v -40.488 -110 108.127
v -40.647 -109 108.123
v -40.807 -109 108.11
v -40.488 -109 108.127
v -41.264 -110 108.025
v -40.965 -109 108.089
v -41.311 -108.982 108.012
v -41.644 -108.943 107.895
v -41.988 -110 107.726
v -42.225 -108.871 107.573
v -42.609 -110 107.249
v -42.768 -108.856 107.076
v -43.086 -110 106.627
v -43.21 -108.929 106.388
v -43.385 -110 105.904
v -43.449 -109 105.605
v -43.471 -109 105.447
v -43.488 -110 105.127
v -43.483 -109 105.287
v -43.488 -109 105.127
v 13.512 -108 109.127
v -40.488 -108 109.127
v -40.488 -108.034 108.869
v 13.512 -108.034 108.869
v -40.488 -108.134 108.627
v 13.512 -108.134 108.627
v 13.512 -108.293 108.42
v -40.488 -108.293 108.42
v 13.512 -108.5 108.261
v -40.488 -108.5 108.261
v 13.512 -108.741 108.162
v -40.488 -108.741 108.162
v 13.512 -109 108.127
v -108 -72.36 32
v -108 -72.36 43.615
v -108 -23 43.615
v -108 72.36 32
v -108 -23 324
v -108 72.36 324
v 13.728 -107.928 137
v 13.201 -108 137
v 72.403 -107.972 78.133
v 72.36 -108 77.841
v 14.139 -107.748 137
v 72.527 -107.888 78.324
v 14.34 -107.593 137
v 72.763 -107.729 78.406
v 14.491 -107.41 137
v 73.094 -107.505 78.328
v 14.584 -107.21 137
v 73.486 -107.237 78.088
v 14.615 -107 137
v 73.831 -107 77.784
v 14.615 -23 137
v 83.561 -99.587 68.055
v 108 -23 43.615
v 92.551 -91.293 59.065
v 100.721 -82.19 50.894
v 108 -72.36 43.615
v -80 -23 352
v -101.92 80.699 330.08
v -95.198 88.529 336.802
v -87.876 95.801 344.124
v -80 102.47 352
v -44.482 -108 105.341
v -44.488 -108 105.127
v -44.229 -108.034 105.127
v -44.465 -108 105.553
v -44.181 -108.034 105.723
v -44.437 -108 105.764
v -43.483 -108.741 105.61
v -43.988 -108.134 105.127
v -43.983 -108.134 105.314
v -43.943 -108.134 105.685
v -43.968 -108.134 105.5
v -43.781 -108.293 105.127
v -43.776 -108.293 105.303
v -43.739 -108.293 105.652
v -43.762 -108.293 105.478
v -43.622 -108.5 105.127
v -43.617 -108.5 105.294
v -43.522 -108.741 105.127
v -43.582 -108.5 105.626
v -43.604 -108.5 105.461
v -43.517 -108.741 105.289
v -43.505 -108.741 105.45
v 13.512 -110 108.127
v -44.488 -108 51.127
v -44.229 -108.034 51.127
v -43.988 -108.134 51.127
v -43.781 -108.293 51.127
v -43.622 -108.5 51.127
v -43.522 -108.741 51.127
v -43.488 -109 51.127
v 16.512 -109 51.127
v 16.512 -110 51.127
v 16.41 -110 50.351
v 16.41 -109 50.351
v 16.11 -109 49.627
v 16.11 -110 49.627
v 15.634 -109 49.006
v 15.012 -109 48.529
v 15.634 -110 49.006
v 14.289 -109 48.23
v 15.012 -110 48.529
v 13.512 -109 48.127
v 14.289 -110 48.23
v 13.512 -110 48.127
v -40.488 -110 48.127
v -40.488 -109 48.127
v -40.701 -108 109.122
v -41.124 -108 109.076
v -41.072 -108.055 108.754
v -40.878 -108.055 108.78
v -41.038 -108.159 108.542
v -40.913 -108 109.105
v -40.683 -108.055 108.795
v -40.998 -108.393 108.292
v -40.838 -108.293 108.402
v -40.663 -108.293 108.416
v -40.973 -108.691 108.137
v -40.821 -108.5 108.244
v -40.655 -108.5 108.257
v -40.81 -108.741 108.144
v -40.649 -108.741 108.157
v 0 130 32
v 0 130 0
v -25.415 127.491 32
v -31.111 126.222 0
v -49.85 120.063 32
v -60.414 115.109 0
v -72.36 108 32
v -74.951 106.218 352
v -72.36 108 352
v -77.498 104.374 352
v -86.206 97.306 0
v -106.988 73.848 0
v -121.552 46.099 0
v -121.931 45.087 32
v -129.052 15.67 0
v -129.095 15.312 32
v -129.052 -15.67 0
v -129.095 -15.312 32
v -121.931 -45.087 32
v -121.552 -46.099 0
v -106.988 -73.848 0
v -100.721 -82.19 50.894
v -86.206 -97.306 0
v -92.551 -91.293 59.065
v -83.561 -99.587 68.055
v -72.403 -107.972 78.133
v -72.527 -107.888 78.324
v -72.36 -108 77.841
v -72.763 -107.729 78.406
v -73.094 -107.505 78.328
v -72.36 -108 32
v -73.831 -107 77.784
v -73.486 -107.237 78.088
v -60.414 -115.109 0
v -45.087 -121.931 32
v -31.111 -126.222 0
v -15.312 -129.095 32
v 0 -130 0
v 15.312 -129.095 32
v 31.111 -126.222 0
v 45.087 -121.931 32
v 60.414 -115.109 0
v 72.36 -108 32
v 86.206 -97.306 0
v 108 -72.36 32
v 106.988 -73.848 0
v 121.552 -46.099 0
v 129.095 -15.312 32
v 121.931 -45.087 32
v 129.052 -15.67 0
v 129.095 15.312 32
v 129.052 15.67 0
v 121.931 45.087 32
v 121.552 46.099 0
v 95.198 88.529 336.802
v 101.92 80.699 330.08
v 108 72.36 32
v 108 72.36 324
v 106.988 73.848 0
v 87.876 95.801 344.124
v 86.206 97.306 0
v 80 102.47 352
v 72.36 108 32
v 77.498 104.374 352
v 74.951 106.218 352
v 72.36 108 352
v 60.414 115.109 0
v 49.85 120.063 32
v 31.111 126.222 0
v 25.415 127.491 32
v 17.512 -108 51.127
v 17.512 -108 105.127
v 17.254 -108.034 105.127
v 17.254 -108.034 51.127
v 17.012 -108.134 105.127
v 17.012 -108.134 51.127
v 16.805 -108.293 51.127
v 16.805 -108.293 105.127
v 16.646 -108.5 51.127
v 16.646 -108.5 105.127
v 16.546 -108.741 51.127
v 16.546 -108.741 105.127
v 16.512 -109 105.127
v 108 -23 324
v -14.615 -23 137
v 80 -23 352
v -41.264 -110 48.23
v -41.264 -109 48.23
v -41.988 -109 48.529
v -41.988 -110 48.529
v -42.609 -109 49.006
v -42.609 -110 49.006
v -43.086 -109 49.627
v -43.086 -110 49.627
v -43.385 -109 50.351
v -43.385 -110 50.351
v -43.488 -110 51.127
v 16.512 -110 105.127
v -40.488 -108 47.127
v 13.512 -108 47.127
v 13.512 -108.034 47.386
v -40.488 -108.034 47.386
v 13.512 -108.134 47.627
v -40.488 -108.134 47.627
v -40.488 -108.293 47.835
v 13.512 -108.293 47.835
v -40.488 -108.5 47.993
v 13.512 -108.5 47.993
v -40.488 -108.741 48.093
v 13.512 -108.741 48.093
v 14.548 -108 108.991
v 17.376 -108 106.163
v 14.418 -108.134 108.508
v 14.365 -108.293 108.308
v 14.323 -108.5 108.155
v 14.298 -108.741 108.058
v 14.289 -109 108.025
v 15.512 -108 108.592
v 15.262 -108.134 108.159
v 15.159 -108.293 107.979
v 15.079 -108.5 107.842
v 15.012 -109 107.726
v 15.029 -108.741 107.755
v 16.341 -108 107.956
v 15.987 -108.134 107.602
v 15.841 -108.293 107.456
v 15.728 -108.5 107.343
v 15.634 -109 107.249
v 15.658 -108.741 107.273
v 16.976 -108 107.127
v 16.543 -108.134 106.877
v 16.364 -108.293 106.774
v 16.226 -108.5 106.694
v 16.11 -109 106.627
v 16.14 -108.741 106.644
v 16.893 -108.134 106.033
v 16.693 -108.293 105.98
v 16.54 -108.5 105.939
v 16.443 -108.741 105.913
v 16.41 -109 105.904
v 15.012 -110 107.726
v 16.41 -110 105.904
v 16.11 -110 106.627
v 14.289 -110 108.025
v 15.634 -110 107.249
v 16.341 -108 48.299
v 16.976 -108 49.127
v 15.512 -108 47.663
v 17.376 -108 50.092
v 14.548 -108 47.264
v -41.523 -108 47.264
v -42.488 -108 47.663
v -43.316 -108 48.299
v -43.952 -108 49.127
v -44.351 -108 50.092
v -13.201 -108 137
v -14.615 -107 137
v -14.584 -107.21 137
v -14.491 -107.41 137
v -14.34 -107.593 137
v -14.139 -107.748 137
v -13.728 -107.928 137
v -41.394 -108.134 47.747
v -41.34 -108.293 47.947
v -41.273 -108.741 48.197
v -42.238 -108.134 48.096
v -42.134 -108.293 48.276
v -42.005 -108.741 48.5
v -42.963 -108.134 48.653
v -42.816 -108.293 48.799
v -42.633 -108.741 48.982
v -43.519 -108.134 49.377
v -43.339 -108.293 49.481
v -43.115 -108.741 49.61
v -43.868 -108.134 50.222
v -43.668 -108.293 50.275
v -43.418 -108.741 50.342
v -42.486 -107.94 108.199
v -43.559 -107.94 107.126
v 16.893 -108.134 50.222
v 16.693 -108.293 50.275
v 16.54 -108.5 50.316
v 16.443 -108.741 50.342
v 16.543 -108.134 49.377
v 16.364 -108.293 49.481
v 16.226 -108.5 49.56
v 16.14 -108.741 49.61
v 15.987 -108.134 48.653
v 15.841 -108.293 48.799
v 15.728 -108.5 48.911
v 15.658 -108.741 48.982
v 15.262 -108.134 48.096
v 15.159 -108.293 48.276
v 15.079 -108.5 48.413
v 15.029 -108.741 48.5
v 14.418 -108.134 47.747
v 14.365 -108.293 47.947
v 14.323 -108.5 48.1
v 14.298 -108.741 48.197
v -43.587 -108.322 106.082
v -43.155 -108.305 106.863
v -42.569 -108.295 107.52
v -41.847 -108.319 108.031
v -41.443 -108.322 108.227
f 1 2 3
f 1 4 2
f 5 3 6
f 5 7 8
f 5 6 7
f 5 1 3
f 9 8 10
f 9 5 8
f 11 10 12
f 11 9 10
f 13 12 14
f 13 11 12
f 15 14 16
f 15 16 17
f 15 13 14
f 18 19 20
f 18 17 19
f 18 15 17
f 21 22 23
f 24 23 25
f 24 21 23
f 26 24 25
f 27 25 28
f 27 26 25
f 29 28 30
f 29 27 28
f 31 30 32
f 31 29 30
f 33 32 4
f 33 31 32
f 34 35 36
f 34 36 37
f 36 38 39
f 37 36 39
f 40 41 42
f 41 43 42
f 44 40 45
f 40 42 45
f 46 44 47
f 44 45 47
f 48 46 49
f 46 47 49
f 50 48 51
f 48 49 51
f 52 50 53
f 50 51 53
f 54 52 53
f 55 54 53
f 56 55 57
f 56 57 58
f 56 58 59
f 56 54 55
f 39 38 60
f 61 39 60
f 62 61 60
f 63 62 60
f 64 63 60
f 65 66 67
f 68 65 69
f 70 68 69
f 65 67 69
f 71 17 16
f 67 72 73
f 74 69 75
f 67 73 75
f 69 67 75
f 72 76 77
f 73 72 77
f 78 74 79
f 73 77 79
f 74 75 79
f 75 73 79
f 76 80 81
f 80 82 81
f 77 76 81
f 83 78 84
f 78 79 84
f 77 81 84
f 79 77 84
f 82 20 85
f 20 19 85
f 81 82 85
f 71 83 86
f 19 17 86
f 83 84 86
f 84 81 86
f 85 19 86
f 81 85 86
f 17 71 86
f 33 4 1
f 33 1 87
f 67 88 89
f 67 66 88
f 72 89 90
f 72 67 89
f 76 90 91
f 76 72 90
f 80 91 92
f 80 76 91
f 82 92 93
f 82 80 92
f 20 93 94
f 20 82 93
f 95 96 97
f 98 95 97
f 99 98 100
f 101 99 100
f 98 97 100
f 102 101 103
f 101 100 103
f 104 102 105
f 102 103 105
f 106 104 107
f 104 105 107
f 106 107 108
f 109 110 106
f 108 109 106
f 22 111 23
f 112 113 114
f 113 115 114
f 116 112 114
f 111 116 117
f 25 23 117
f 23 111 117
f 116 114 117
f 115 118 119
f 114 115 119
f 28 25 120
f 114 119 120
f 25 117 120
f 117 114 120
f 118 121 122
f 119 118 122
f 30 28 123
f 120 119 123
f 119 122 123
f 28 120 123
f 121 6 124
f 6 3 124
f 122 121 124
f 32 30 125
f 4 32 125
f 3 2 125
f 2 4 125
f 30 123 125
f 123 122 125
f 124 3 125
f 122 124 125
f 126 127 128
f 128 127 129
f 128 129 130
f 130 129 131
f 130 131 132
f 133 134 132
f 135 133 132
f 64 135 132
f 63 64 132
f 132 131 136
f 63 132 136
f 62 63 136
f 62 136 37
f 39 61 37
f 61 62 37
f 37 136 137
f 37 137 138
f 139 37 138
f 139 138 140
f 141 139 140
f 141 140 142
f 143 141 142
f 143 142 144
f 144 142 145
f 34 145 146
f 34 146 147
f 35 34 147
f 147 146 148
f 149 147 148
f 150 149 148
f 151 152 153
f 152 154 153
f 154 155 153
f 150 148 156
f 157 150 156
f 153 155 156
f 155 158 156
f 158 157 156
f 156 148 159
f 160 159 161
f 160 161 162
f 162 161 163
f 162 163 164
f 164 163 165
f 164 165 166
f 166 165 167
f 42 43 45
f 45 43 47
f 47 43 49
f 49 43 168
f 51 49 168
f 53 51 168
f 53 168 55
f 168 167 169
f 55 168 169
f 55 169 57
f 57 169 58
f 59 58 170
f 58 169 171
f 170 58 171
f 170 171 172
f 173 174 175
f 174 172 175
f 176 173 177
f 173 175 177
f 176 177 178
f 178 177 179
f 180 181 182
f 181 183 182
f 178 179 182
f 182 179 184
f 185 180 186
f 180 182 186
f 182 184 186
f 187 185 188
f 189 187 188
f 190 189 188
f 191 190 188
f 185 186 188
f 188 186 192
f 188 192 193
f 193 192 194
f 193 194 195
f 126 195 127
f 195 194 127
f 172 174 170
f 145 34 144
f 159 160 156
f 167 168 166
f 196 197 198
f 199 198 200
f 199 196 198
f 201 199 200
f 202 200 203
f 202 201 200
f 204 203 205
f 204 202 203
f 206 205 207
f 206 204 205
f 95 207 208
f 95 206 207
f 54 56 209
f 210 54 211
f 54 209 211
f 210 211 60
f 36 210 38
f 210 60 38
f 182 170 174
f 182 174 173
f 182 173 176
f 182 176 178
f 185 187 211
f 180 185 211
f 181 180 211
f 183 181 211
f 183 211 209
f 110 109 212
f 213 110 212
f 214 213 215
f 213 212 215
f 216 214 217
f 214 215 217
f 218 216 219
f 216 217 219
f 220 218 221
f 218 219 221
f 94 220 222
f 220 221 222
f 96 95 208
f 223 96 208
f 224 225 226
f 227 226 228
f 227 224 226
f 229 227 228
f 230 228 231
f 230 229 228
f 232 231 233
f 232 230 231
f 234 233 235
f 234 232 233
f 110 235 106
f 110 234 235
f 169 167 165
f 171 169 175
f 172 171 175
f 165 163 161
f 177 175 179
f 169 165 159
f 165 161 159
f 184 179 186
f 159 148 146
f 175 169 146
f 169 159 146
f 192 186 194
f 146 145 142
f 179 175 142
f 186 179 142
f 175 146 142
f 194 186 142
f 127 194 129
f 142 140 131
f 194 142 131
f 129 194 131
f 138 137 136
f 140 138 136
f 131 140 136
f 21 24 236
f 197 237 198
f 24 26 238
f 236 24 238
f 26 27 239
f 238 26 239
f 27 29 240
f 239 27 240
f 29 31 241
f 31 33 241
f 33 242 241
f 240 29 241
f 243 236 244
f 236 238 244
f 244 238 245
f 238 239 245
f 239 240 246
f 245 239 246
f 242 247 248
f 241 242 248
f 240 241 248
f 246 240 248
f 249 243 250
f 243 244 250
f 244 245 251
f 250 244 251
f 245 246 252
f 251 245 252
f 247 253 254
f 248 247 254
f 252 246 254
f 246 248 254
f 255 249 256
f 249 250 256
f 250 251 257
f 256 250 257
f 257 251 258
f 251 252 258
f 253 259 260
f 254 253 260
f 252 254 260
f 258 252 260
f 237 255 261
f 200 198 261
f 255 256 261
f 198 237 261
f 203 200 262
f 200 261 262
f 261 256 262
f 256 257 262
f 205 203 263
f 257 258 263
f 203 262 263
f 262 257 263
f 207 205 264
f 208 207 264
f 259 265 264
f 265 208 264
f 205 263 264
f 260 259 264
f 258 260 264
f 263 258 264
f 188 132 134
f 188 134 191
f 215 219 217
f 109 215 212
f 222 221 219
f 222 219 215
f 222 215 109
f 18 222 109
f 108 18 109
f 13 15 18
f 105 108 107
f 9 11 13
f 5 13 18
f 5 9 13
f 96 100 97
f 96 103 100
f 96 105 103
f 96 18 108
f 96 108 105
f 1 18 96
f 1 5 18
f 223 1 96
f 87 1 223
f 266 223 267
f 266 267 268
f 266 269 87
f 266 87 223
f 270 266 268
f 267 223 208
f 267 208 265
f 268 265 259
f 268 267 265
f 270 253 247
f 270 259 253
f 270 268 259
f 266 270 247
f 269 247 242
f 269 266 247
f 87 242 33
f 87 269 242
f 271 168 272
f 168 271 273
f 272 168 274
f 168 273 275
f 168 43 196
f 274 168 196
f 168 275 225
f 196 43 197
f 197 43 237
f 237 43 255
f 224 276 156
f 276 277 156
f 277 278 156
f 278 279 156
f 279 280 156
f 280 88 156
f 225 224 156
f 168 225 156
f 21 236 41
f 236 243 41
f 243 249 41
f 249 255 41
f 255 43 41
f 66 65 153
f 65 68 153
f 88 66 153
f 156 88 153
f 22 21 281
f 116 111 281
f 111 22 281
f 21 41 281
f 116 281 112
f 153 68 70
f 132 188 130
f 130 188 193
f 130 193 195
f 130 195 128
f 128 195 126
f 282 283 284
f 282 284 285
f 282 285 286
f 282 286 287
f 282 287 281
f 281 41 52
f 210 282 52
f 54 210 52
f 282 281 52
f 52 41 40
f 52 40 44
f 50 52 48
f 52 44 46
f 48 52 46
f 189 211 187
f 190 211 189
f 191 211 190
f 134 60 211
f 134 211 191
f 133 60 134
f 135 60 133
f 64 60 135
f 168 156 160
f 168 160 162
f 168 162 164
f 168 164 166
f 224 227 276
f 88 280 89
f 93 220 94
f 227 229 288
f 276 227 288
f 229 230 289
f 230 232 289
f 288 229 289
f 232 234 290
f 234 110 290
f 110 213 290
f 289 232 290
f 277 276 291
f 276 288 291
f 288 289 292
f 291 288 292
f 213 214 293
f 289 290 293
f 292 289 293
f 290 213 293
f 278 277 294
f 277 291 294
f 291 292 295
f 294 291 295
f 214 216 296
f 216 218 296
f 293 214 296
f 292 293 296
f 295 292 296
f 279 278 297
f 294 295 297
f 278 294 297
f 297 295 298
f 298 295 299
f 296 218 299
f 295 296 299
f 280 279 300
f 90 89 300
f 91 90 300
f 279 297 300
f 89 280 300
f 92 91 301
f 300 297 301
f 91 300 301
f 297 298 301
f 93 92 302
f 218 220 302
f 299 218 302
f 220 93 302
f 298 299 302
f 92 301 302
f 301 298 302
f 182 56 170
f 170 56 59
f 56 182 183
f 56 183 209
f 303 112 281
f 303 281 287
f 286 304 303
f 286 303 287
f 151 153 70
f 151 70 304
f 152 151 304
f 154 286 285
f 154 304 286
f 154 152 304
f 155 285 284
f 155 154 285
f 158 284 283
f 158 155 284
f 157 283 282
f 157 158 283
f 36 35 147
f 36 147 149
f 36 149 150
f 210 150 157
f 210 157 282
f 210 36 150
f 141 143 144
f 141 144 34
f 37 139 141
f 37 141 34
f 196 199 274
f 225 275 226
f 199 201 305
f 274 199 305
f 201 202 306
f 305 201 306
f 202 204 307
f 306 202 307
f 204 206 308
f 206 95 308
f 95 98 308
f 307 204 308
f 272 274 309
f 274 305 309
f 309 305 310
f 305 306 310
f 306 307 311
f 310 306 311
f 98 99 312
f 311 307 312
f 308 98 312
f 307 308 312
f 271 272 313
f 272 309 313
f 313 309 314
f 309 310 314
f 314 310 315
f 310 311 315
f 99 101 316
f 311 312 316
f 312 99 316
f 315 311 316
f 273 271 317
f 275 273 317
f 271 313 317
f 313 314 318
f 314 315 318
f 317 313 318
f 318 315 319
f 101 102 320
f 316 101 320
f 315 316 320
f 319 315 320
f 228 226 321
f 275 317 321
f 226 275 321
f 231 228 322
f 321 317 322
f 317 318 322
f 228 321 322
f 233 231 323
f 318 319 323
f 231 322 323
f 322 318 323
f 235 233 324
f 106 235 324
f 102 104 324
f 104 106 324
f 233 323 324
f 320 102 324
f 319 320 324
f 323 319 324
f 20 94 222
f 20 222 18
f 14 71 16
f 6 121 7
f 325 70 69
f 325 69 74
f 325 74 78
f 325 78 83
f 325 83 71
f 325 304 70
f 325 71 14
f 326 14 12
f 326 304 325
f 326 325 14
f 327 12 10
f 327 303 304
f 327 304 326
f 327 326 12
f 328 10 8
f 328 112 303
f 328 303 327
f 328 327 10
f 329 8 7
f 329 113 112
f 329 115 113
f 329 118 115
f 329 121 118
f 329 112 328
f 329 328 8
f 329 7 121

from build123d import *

# Parameters (mm, degrees)
SKETCH3_R             = 130
BOSS_EXTRUDE1_DEPTH   = 352
CUT_EXTRUDE2_DEPTH    = 320
CUT_EXTRUDE3_DEPTH    = 320
CUT_EXTRUDE4_DEPTH    = 85
CUT_EXTRUDE5_DEPTH    = 85
CUT_EXTRUDE7_REACH    = 354
CUT_EXTRUDE8_REACH    = 354
CUT_EXTRUDE9_DEPTH    = 285
SKETCH22_W            = 60
SKETCH22_H            = 60
BOSS_EXTRUDE3_DEPTH   = 2
FILLET1_R             = 3
FILLET2_R             = 3
FILLET4_R             = 1
FILLET5_R             = 1
BODY_MOVE_COPY2_ANGLE = 90
BODY_MOVE_COPY3_ANGLE = 90
BODY_MOVE_COPY4_ANGLE = 180


with BuildPart() as part:
    # Sketch3 → Boss-Extrude1 (new body)
    with BuildSketch(Plane(origin=(0, 0, 0), x_dir=(1, 0, 0), z_dir=(0, 1, 0))):
        Circle(SKETCH3_R)
    extrude(amount=BOSS_EXTRUDE1_DEPTH)

    # Sketch11 → Cut-Extrude2 (cut)
    with BuildSketch(Plane(origin=(0, 352, 0), x_dir=(1, 0, 0), z_dir=(0, 1, 0))):
        with BuildLine():
            Line((72.360210061, -108), (0, -108))
            Line((0, -108), (-72.360210061, -108))
            ThreePointArc((-72.360210061, -108), (0, -130), (72.360210061, -108))
        make_face()
        with BuildLine():
            Line((-72.360210061, 108), (72.360210061, 108))
            ThreePointArc((72.360210061, 108), (0, 130), (-72.360210061, 108))
        make_face()
    extrude(amount=-CUT_EXTRUDE2_DEPTH, mode=Mode.SUBTRACT)

    # Sketch11<4> → Cut-Extrude3 (cut)
    with BuildSketch(Plane(origin=(0, 352, 0), x_dir=(1, 0, 0), z_dir=(0, 1, 0))):
        with BuildLine():
            ThreePointArc((-108, 72.360210061), (-130, 0), (-108, -72.360210061))
            Line((-108, -72.360210061), (-108, 72.360210061))
        make_face()
        with BuildLine():
            Line((108, 72.360210061), (108, 0))
            Line((108, 0), (108, -72.360210061))
            ThreePointArc((108, -72.360210061), (124.378454726, -37.815340802), (130, 0))
            ThreePointArc((130, 0), (124.378454726, 37.815340802), (108, 72.360210061))
        make_face()
    extrude(amount=-CUT_EXTRUDE3_DEPTH, mode=Mode.SUBTRACT)

    # Sketch12 → Cut-Extrude4 (cut)
    with BuildSketch(Plane.ZY.offset(108)):
        Polygon((-72.360210061, 137), (0, 137), (72.360210061, 137), (72.360210061, 352), (-72.360210061, 352), align=None)
    extrude(amount=-CUT_EXTRUDE4_DEPTH, mode=Mode.SUBTRACT)

    # Sketch14 → Cut-Extrude5 (cut)
    with BuildSketch(Plane.ZY.offset(108)):
        Polygon((-72.360210061, 79.254886678), (-14.615096739, 137), (-72.360210061, 137), align=None)
        Polygon((72.360210061, 137), (14.615096739, 137), (72.360210061, 79.254886678), align=None)
    extrude(amount=-CUT_EXTRUDE5_DEPTH, mode=Mode.SUBTRACT)

    # Cut-Extrude7: up to this face of the body (flat: up to its plane)
    cut_extrude7_end = Plane(part.part.faces().sort_by_distance((-65.5, 108.127443339, -43.4876534))[0])
    # Sketch15 → Cut-Extrude7 (cut, up to the picked face)
    with BuildSketch(Plane(origin=(0, 352, 0), x_dir=(1, 0, 0), z_dir=(0, 1, 0)), mode=Mode.PRIVATE) as cut_extrude7_sk1:
        with BuildLine():
            Line((-108, 72.360210061), (-23, 72.360210061))
            Line((-23, 72.360210061), (-23, 108))
            Line((-23, 108), (-72.360210061, 108))
            ThreePointArc((-72.360210061, 108), (-91.923881554, 91.923881554), (-108, 72.360210061))
        make_face()
    cut_extrude7_tool1 = split(extrude(cut_extrude7_sk1.sketch, amount=-CUT_EXTRUDE7_REACH, mode=Mode.PRIVATE), bisect_by=cut_extrude7_end, keep=Keep.BOTH, mode=Mode.PRIVATE)
    add(cut_extrude7_tool1.solids().sort_by_distance((-58.500557, 352, -88.680695))[0], mode=Mode.SUBTRACT)

    # Cut-Extrude8: up to this face of the body (flat: up to its plane)
    cut_extrude8_end = Plane(part.part.faces().sort_by_distance((-65.5, 108.127443339, 43.4876534))[0])
    # Sketch15<4> → Cut-Extrude8 (cut, up to the picked face)
    with BuildSketch(Plane(origin=(0, 352, 0), x_dir=(1, 0, 0), z_dir=(0, 1, 0)), mode=Mode.PRIVATE) as cut_extrude8_sk1:
        with BuildLine():
            Line((-23, -108), (-23, -72.360210061))
            Line((-23, -72.360210061), (-108, -72.360210061))
            ThreePointArc((-108, -72.360210061), (-91.923881554, -91.923881554), (-72.360210061, -108))
            Line((-72.360210061, -108), (-23, -108))
        make_face()
    cut_extrude8_tool1 = split(extrude(cut_extrude8_sk1.sketch, amount=-CUT_EXTRUDE8_REACH, mode=Mode.PRIVATE), bisect_by=cut_extrude8_end, keep=Keep.BOTH, mode=Mode.PRIVATE)
    add(cut_extrude8_tool1.solids().sort_by_distance((-58.500557, 352, 88.680695))[0], mode=Mode.SUBTRACT)

    # Sketch18 → Cut-Extrude9 (cut)
    with BuildSketch(Plane.ZY.offset(23)):
        Polygon((-108, 324), (-80, 352), (-108, 352), align=None)
        Polygon((108, 352), (80, 352), (108, 324), align=None)
    extrude(amount=-CUT_EXTRUDE9_DEPTH, mode=Mode.SUBTRACT)

    # Sketch22 → Boss-Extrude3 (add)
    with BuildSketch(Plane.ZY.offset(108)):
        with Locations((-13.4876534, 78.127443339)):
            Rectangle(SKETCH22_W, SKETCH22_H)
    extrude(amount=BOSS_EXTRUDE3_DEPTH)

    # Fillet1
    fillet1_edges = [part.edges().sort_by_distance(p)[0] for p in [
        (-109, 108.127443339, -43.4876534),
    ]]
    fillet(fillet1_edges, radius=FILLET1_R)

    # Fillet2
    fillet2_edges = [part.edges().sort_by_distance(p)[0] for p in [
        (-109, 48.127443339, 16.5123466),
        (-109, 108.127443339, 16.5123466),
        (-109, 48.127443339, -43.4876534),
    ]]
    fillet(fillet2_edges, radius=FILLET2_R)

    # Fillet4
    fillet4_edges = [part.edges().sort_by_distance(p)[0] for p in [
        (-108, 122.56372167, -29.051375069),
        (-108, 93.691165009, -57.92393173),
        (-108, 108.127443339, 43.4876534),
    ]]
    fillet(fillet4_edges, radius=FILLET4_R)

    # Fillet5
    fillet5_edges = [part.edges().sort_by_distance(p)[0] for p in [
        (-108, 78.127443339, -43.4876534),
        (-108, 108.127443339, -13.4876534),
        (-108, 107.248763683, -42.608973743),
        (-108, 48.127443339, -13.4876534),
        (-108, 78.127443339, 16.5123466),
        (-108, 49.006122995, -42.608973743),
        (-108, 49.006122995, 15.633666944),
        (-108, 107.248763683, 15.633666944),
    ]]
    fillet(fillet5_edges, radius=FILLET5_R)


with BuildPart() as part_1:
    # Body-Move/Copy2: moved
    add(part.part.rotate(Axis((0, 0, 0), (1, 0, 0)), BODY_MOVE_COPY2_ANGLE))


with BuildPart() as part_2:
    # Body-Move/Copy3: moved
    add(part_1.part.rotate(Axis((0, 0, 0), (0, 0, -1)), BODY_MOVE_COPY3_ANGLE))


with BuildPart() as part_3:
    # Body-Move/Copy4: moved
    add(part_2.part.rotate(Axis((0, 0, 0), (0, 0, 1)), BODY_MOVE_COPY4_ANGLE))


solid = part_3.part
